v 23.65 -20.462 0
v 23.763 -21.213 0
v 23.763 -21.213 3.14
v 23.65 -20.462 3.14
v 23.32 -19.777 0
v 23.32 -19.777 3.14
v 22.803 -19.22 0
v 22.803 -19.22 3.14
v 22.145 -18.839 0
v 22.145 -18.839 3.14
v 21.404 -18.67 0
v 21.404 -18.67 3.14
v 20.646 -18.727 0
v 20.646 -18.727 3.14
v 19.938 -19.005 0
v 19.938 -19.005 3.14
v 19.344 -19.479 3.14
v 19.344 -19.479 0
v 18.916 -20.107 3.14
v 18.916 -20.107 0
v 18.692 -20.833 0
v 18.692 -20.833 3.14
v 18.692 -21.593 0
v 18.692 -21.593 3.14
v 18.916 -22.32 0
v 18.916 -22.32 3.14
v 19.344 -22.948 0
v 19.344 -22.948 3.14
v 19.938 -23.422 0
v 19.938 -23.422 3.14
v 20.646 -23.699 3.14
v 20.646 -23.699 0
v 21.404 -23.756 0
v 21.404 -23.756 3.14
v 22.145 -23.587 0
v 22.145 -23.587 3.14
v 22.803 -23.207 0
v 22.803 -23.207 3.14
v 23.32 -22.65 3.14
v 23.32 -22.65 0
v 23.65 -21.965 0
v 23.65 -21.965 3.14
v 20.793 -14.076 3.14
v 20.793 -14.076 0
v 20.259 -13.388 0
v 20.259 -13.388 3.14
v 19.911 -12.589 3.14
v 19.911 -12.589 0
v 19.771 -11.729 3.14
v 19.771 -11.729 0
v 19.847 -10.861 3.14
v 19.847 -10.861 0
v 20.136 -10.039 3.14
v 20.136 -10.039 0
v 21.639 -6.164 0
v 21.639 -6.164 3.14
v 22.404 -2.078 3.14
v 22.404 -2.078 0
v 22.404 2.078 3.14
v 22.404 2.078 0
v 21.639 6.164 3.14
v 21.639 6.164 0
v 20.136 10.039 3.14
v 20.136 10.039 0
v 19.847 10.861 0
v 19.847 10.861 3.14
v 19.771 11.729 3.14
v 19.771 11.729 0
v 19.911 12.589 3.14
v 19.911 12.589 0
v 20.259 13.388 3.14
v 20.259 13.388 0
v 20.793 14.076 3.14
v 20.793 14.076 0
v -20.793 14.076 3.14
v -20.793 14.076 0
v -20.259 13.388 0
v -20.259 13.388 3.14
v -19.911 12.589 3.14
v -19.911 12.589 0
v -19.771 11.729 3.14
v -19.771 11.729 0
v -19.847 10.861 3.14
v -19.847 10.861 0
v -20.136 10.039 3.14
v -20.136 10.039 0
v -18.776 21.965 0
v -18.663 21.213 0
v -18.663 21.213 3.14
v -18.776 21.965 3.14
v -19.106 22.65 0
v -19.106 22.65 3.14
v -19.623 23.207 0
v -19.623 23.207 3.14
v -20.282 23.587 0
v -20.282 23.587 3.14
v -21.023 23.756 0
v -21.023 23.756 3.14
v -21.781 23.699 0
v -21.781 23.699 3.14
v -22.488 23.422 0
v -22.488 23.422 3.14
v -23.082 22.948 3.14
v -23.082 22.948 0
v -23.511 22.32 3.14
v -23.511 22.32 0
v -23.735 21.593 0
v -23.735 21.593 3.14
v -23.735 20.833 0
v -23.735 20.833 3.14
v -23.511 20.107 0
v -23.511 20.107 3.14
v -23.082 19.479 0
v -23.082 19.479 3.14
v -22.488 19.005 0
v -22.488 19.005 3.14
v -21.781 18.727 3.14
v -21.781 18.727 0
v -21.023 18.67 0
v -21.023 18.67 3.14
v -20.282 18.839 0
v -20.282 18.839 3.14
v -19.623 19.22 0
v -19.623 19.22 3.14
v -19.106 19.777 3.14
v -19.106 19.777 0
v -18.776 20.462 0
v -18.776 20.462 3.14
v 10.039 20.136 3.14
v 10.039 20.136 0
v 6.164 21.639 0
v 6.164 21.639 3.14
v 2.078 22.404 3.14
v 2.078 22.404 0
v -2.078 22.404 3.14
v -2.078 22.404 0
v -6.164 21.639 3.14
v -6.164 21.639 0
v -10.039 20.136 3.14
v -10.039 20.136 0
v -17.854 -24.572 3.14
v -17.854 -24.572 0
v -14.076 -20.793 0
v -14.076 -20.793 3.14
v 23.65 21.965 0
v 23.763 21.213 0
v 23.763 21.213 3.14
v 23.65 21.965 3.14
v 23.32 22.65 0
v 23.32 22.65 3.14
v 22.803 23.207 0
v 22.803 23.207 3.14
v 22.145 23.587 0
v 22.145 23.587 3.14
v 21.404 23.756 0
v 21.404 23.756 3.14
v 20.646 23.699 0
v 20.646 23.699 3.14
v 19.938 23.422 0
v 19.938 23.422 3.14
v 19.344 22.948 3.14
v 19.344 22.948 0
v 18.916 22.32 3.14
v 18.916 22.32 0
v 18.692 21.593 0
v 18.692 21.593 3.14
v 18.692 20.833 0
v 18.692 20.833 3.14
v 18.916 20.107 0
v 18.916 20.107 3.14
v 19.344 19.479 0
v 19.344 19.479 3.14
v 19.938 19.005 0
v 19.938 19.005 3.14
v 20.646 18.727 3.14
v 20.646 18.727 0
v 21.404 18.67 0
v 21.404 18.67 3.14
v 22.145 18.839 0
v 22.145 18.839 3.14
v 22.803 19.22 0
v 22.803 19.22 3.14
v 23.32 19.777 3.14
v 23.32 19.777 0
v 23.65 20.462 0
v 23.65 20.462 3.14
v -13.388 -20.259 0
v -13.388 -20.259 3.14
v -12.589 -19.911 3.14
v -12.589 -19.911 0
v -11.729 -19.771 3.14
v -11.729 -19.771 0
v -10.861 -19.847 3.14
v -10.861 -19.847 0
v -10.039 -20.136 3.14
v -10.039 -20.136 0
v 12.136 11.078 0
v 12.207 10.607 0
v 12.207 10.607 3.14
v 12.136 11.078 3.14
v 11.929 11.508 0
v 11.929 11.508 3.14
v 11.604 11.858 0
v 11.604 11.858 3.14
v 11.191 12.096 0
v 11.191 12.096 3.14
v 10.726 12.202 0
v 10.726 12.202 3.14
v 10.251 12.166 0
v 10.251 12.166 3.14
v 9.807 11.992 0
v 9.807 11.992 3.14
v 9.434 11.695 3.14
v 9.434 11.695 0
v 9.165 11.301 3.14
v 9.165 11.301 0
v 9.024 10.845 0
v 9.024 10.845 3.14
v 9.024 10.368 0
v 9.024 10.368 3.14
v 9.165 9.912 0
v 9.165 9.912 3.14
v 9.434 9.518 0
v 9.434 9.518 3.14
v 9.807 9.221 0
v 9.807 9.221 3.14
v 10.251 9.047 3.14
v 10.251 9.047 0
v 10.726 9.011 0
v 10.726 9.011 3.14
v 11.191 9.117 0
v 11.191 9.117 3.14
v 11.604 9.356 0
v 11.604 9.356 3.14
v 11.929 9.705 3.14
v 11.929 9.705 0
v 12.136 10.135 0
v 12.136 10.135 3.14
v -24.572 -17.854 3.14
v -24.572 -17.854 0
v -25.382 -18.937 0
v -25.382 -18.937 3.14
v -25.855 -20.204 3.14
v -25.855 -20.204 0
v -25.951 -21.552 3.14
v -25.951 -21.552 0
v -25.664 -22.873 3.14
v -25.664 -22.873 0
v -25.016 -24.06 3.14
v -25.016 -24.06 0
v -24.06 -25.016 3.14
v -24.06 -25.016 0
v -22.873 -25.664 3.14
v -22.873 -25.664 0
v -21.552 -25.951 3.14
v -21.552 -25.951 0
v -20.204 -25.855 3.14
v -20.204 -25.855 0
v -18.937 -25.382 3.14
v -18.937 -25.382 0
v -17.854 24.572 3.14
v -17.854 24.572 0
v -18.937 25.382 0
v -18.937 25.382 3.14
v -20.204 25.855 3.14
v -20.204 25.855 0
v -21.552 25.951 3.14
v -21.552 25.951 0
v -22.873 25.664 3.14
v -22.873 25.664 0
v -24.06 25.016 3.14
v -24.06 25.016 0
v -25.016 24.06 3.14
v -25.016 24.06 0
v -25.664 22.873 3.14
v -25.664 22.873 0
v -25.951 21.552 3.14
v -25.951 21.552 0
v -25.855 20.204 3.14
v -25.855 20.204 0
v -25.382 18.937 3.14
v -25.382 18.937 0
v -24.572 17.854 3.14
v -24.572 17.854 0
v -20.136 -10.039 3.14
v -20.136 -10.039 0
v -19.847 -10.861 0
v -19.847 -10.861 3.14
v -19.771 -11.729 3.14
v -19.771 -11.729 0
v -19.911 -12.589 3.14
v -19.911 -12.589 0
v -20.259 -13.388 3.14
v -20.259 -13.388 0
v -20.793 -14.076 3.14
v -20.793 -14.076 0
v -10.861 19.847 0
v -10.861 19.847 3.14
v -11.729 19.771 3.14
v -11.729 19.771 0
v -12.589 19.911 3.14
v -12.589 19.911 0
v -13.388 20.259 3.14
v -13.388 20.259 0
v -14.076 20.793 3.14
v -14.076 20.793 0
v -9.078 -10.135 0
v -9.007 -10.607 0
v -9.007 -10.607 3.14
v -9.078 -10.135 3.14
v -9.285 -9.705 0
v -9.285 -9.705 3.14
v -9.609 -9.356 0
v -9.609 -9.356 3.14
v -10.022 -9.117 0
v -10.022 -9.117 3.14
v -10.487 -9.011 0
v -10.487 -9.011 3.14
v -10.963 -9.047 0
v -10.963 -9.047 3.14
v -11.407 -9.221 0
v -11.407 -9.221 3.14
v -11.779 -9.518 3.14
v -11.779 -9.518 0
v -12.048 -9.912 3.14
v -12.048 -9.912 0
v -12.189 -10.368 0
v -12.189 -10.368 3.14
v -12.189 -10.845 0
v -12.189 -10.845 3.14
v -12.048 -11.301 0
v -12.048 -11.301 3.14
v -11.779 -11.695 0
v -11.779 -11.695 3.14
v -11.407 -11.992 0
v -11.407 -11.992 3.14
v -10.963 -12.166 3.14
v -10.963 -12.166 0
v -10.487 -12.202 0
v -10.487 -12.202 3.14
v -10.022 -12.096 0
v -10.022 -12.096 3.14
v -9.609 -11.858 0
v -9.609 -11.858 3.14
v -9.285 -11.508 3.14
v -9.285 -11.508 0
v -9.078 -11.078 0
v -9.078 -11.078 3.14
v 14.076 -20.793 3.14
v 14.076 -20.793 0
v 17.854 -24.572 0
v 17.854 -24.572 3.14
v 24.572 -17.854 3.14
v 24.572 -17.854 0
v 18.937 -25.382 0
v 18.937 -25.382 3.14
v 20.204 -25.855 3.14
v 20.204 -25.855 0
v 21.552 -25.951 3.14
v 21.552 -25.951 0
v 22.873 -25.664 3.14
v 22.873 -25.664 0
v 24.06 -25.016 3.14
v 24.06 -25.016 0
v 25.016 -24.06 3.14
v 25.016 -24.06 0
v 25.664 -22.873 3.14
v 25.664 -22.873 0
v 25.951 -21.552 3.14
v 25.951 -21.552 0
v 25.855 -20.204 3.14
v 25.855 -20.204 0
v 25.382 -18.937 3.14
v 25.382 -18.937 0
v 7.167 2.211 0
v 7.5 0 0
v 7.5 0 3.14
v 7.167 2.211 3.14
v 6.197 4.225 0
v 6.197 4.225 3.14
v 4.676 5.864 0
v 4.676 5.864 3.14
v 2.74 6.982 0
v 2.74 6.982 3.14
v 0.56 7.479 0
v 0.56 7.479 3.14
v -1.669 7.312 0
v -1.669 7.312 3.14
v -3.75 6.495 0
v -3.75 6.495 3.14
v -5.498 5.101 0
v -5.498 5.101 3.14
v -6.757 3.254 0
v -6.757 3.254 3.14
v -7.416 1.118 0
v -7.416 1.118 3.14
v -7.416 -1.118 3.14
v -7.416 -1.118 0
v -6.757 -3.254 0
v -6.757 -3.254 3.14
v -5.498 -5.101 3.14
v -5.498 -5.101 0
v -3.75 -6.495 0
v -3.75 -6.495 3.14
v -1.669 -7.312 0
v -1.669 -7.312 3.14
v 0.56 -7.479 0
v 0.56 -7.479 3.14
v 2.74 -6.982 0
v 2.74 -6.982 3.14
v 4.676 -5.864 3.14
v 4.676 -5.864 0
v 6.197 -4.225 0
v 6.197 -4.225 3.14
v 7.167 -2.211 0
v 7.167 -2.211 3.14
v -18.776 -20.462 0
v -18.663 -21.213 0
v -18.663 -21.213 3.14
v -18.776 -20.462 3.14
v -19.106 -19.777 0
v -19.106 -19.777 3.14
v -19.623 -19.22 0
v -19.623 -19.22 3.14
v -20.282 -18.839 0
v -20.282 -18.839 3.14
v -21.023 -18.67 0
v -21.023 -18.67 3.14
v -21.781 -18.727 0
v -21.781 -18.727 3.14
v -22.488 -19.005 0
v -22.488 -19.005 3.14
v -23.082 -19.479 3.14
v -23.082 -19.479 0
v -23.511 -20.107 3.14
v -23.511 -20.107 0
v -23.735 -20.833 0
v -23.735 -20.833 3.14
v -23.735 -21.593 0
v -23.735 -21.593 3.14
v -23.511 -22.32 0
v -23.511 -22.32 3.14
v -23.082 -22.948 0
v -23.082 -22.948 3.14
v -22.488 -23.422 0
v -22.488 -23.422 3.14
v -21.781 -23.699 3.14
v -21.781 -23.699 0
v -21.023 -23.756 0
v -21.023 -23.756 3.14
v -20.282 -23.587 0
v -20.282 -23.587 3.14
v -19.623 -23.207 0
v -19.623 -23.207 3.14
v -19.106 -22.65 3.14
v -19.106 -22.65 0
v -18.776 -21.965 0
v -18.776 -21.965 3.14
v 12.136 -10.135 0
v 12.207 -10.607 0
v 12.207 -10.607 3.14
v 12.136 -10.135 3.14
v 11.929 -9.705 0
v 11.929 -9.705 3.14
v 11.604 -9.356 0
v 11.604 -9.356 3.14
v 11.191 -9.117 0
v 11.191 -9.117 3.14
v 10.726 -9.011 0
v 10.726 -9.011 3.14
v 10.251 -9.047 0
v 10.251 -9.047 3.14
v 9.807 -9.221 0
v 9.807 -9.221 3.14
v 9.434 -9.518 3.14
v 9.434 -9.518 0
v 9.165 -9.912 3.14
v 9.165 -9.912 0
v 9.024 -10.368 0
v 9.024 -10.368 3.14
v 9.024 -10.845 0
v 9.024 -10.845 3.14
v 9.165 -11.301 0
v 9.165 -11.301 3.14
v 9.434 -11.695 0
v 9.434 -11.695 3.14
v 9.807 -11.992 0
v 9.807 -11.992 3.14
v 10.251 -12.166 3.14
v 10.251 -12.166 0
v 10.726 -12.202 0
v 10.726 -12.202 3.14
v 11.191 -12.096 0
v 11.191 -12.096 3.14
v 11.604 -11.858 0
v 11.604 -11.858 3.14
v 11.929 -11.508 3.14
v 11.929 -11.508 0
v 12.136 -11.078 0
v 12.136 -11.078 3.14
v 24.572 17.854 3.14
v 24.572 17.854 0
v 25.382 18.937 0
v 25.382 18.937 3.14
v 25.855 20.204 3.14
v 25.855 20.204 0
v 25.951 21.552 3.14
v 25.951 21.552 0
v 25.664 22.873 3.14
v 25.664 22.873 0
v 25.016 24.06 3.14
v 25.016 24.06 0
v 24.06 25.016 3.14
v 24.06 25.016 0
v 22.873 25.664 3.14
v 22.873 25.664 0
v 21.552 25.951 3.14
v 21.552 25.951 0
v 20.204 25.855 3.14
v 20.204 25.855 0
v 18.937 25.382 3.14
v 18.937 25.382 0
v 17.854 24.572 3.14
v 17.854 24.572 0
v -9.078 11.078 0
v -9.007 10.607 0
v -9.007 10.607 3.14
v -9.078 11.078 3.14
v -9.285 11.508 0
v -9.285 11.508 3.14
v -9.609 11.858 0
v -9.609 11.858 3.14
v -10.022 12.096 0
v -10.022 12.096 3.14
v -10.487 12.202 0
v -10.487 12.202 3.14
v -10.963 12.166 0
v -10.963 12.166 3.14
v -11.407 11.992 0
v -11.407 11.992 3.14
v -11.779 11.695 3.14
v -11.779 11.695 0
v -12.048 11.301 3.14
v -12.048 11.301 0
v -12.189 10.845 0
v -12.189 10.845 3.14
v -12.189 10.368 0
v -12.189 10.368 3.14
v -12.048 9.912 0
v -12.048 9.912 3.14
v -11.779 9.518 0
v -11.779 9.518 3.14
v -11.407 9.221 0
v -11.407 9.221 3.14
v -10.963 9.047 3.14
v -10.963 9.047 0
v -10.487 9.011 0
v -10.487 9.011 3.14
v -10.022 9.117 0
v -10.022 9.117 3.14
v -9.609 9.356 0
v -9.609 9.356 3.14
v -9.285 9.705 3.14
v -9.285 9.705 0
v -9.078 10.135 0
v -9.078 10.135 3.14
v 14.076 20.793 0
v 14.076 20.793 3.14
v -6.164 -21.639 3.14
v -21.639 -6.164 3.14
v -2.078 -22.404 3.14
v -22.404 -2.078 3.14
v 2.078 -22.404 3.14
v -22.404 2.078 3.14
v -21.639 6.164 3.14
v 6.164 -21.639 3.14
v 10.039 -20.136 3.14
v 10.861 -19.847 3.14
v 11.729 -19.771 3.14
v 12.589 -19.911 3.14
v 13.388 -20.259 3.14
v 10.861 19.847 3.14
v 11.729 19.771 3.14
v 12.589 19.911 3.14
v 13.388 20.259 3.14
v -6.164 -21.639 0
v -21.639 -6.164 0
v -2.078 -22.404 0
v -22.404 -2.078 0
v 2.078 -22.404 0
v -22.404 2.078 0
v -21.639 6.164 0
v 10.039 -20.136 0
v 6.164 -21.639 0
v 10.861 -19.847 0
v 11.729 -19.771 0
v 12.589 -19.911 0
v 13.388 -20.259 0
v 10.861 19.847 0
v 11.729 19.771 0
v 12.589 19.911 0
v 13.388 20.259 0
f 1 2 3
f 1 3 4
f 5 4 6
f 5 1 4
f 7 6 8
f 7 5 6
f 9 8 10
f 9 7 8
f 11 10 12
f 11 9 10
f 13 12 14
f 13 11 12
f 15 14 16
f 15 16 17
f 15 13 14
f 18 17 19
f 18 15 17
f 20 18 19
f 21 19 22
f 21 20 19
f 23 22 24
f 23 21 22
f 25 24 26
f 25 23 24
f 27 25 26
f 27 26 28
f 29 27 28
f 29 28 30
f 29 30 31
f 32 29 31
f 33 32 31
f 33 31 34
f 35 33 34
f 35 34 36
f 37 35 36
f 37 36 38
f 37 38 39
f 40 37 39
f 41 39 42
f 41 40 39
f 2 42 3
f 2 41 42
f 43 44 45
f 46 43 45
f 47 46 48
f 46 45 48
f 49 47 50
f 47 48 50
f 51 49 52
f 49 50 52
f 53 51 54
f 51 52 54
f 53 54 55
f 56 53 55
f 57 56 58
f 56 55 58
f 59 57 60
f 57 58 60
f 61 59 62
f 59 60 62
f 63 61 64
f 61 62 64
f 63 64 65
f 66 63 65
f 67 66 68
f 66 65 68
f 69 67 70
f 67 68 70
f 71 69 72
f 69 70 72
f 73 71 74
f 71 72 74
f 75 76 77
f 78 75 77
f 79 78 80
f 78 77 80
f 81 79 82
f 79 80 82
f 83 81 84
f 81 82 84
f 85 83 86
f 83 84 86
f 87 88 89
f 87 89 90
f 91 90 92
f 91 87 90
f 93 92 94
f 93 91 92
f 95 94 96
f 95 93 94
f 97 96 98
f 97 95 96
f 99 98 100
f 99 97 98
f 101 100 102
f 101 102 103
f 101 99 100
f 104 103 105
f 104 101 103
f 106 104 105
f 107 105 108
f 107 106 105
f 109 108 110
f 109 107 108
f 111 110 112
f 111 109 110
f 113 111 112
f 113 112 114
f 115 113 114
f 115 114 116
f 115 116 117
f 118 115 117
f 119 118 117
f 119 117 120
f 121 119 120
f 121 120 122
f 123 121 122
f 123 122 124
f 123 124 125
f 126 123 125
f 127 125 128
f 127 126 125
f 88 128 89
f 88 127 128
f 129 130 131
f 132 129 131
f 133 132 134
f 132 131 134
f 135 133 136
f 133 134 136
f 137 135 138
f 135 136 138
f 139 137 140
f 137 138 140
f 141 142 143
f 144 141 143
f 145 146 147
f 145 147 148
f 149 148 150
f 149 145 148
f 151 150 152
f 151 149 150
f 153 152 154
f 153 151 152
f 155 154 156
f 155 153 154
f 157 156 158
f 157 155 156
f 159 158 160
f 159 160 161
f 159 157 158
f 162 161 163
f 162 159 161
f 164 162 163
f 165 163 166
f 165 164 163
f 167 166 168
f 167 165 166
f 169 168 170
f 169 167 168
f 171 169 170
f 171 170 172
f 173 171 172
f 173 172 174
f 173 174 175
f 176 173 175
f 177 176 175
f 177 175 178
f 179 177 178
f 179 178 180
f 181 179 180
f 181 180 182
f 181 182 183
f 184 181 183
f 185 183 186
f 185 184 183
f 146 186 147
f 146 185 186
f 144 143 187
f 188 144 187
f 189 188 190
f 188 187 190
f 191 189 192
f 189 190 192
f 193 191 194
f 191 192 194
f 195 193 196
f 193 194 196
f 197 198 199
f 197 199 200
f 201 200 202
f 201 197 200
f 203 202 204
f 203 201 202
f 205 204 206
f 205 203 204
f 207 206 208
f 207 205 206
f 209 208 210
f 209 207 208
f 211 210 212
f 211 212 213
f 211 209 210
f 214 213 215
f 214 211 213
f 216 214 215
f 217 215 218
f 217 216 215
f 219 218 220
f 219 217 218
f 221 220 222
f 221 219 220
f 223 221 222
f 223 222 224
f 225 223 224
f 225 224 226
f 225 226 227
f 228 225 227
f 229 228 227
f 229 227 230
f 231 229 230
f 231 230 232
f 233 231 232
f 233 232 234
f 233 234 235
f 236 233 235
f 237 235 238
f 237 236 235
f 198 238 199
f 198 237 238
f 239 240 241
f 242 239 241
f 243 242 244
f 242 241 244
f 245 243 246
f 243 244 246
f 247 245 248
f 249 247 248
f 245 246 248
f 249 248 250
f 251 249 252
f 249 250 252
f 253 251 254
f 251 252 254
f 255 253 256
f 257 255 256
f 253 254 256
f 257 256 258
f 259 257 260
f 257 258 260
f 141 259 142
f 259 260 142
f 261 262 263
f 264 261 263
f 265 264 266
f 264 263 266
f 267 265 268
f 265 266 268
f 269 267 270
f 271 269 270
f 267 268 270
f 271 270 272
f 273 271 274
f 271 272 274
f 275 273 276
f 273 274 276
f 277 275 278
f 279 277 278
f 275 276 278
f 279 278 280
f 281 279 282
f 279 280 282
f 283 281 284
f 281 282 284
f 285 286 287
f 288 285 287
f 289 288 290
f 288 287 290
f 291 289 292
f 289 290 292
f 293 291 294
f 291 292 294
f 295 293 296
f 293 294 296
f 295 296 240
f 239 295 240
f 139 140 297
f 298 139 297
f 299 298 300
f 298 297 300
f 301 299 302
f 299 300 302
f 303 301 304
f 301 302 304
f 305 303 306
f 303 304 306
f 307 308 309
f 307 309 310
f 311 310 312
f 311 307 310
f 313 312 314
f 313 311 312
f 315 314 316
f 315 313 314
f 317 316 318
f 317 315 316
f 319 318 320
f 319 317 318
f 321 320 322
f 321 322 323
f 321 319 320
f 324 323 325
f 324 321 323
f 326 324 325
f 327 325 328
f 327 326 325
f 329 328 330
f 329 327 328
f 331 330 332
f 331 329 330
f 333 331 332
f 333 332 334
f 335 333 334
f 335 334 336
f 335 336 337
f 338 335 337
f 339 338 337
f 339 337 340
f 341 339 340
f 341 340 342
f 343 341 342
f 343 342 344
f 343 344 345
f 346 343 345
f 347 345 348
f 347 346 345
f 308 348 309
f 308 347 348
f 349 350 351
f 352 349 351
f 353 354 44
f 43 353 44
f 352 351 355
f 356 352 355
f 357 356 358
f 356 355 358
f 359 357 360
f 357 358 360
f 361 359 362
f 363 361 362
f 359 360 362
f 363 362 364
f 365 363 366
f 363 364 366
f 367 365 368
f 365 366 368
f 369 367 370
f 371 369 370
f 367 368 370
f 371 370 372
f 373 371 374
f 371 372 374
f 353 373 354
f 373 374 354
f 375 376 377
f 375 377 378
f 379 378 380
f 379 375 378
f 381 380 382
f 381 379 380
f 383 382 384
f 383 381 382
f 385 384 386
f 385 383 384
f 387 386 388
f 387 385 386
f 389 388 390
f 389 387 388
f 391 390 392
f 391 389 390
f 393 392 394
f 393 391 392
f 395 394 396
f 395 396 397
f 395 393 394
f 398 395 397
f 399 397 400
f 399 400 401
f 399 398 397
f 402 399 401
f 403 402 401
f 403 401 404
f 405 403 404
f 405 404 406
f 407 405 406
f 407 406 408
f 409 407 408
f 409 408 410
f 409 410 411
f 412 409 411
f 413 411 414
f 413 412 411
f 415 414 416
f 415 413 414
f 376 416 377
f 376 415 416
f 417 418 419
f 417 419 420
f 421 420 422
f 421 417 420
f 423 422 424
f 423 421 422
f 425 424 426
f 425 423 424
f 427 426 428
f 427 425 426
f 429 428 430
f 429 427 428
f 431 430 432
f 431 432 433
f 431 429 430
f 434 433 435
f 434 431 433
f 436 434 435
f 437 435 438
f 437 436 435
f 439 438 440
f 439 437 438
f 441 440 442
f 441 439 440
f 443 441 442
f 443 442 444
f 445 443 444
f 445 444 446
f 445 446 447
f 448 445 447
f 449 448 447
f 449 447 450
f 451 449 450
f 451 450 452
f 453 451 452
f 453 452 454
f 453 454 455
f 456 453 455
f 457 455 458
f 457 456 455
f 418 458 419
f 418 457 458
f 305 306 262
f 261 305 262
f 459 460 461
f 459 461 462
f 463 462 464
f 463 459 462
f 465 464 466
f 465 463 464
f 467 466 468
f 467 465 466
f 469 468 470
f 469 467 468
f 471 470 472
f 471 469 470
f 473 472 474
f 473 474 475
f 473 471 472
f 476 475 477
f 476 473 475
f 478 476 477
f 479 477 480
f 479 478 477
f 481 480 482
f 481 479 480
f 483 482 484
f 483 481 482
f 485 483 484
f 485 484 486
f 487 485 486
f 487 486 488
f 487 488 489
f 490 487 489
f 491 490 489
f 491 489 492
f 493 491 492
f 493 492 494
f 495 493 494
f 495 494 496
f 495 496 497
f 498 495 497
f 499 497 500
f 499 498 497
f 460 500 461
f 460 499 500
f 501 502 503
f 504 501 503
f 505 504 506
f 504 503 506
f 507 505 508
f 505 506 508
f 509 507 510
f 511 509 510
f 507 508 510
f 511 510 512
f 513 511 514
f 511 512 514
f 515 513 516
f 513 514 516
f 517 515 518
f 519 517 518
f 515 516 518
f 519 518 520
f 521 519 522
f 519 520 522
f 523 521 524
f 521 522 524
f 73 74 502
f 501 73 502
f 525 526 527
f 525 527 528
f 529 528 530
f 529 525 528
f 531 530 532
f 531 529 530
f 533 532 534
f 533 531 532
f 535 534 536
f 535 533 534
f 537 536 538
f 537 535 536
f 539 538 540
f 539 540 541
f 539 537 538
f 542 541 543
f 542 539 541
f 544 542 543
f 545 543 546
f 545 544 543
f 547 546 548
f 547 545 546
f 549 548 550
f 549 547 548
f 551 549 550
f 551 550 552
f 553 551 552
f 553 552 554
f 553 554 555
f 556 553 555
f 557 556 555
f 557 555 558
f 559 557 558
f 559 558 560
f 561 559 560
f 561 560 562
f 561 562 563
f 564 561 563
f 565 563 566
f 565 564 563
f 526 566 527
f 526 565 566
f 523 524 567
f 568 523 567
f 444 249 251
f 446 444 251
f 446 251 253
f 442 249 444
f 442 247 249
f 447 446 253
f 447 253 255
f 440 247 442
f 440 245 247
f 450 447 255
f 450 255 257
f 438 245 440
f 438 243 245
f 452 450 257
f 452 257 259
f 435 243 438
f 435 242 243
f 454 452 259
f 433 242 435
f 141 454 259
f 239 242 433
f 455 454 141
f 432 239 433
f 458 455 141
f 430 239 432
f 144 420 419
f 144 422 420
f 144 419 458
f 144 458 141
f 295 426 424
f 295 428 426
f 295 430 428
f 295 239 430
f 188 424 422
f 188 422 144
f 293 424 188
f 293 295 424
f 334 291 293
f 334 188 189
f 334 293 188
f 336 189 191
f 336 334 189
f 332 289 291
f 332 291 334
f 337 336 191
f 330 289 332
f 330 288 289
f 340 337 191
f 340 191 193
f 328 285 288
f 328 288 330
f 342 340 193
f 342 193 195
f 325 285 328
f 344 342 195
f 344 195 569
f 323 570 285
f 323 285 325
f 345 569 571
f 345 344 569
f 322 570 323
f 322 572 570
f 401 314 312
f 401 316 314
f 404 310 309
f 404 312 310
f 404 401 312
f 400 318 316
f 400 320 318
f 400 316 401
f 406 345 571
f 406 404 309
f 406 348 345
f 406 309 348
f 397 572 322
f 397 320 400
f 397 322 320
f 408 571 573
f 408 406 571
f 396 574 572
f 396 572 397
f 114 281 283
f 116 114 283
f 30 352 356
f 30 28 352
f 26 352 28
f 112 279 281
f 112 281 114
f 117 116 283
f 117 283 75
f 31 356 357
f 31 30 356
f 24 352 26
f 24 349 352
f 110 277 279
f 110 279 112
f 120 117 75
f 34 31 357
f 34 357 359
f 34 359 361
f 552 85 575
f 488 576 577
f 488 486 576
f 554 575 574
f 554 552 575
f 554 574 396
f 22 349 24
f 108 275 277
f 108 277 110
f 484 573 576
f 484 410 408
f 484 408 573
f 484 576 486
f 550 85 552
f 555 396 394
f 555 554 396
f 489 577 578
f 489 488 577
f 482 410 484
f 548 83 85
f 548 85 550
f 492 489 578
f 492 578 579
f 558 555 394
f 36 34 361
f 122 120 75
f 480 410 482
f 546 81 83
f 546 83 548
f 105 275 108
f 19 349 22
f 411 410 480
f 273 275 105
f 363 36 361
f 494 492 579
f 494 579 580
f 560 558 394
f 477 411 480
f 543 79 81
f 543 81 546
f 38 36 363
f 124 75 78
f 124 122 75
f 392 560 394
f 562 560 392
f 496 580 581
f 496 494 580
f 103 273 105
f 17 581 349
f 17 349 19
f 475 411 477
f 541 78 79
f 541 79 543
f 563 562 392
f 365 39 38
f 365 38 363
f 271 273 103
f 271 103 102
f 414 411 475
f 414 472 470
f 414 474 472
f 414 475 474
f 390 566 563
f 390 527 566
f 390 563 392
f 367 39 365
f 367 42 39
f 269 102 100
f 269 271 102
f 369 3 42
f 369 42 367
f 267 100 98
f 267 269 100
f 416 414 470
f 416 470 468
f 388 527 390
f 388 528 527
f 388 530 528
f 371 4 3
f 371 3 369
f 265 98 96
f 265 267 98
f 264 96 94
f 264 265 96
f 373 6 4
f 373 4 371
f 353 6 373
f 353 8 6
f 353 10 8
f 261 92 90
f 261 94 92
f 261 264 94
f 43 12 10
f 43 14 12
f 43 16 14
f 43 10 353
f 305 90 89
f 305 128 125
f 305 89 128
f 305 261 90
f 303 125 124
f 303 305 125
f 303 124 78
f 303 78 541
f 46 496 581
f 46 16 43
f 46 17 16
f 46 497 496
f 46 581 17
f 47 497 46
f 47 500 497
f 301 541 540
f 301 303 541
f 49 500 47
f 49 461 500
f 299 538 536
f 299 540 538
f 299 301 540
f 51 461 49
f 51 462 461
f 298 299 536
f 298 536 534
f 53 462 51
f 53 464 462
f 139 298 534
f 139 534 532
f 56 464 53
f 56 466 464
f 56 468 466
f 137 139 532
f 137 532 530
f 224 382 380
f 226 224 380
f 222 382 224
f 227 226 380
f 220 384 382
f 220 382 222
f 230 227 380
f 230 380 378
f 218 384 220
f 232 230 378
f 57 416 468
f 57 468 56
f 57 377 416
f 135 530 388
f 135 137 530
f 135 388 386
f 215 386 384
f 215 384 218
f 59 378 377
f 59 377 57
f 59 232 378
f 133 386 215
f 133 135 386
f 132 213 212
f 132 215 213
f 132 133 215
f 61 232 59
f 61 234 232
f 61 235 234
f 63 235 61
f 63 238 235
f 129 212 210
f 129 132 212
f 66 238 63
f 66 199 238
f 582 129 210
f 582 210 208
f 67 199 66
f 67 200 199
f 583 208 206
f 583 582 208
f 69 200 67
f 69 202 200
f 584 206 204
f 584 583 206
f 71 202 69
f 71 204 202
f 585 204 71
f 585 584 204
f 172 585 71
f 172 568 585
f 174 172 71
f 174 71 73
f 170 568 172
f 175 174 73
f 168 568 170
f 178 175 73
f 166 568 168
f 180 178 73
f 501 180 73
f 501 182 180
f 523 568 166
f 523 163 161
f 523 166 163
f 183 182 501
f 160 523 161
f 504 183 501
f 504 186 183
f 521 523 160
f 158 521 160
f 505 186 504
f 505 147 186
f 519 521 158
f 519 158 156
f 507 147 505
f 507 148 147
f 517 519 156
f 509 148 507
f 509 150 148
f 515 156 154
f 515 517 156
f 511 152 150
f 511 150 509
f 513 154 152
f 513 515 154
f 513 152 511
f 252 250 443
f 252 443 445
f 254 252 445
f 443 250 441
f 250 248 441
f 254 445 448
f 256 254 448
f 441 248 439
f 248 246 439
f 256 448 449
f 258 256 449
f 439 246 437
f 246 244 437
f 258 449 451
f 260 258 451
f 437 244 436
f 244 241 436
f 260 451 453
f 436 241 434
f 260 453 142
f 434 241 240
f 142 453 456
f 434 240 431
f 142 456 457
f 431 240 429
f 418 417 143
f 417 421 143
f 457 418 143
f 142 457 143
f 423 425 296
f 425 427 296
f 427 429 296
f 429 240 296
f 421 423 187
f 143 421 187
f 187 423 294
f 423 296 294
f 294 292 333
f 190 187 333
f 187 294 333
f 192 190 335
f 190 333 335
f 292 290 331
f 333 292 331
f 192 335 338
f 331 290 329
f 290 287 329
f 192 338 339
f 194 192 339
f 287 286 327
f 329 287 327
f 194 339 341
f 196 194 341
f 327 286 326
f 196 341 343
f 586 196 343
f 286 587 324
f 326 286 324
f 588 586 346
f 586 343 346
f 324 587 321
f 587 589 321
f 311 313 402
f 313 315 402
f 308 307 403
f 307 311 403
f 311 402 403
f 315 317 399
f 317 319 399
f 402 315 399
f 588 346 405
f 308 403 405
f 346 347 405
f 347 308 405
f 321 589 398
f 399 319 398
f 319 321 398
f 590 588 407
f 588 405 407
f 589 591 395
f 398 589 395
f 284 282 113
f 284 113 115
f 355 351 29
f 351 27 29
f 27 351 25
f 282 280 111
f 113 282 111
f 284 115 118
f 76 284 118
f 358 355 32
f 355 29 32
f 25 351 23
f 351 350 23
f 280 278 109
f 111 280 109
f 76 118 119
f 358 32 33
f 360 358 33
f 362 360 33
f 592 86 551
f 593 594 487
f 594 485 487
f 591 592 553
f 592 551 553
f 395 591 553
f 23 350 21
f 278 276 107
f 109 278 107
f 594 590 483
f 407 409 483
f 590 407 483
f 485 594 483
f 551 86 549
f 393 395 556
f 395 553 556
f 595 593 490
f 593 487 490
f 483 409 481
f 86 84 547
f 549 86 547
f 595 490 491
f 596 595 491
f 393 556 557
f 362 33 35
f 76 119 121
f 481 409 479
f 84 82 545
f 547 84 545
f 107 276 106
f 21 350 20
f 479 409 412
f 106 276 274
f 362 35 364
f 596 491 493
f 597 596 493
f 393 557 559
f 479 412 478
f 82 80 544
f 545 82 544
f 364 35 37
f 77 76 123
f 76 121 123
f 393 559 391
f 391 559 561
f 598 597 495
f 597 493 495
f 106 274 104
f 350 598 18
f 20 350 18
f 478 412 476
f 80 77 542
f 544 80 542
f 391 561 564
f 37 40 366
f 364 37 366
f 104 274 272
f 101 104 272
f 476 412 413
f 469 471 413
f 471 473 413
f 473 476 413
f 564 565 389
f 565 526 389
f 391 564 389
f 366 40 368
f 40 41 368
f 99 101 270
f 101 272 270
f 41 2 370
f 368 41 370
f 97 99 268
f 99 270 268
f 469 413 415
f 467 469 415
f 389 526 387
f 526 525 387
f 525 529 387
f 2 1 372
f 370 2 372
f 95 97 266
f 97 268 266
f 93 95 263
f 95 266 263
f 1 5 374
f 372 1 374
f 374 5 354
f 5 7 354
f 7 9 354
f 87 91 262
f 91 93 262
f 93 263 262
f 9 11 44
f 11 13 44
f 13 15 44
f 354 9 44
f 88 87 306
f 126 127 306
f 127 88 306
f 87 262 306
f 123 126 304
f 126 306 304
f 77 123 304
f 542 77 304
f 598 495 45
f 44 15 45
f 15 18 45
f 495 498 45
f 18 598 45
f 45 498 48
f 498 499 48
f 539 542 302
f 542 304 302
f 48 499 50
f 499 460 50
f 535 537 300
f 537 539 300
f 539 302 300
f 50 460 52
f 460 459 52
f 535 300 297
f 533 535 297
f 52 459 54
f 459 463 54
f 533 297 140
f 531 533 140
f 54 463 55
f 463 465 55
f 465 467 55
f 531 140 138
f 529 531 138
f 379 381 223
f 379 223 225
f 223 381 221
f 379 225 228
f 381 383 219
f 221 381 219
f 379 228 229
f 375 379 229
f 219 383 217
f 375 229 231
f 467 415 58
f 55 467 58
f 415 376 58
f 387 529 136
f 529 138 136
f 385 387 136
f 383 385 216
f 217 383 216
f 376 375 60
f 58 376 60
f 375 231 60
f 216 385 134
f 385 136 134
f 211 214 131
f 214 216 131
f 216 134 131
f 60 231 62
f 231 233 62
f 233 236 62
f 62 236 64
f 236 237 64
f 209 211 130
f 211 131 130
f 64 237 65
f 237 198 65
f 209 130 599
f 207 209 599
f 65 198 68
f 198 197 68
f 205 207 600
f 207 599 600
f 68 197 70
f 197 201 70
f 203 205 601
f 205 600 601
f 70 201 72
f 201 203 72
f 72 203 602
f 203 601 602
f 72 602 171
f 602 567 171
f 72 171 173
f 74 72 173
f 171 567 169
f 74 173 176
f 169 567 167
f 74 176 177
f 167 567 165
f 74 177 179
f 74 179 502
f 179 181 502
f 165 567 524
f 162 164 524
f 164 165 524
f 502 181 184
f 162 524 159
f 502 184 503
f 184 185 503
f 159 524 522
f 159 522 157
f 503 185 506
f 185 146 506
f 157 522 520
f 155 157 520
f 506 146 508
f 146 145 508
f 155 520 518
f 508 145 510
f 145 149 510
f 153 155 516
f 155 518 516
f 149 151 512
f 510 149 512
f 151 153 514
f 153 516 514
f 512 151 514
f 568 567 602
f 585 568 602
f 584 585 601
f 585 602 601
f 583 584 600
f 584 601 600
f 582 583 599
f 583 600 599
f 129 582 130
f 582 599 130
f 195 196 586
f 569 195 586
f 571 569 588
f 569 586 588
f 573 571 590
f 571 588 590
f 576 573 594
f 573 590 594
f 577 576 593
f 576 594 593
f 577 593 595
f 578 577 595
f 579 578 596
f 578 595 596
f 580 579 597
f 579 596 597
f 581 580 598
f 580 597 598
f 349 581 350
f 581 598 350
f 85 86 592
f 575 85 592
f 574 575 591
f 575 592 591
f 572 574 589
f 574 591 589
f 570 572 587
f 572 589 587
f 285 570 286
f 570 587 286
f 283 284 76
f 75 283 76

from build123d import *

# Parameters (mm, degrees)
F0_R     = 2.55
F0_R_2   = 1.6
F0_R_3   = 7.5
F1_DEPTH = 3.14


with BuildPart() as f1:
    # F0 (on Top) → F1 (new body)
    with BuildSketch(Plane.XY):
        with BuildLine():
            ThreePointArc((-17.854446, 24.571961), (-24.571961, 24.571961), (-24.571961, 17.854446))
            Line((-24.571961, 17.854446), (-20.793457, 14.075942))
            ThreePointArc((-20.793457, 14.075942), (-19.813844, 12.163673), (-20.136055, 10.039386))
            ThreePointArc((-20.136055, 10.039386), (-22.5, 0), (-20.136055, -10.039386))
            ThreePointArc((-20.136055, -10.039386), (-19.813844, -12.163673), (-20.793457, -14.075942))
            Line((-20.793457, -14.075942), (-24.571961, -17.854446))
            ThreePointArc((-24.571961, -17.854446), (-24.571961, -24.571961), (-17.854446, -24.571961))
            Line((-17.854446, -24.571961), (-14.075942, -20.793457))
            ThreePointArc((-14.075942, -20.793457), (-12.163673, -19.813844), (-10.039386, -20.136055))
            ThreePointArc((-10.039386, -20.136055), (0, -22.5), (10.039386, -20.136055))
            ThreePointArc((10.039386, -20.136055), (12.163673, -19.813844), (14.075942, -20.793457))
            Line((14.075942, -20.793457), (17.854446, -24.571961))
            ThreePointArc((17.854446, -24.571961), (24.571961, -24.571961), (24.571961, -17.854446))
            Line((24.571961, -17.854446), (20.793457, -14.075942))
            ThreePointArc((20.793457, -14.075942), (19.813844, -12.163673), (20.136055, -10.039386))
            ThreePointArc((20.136055, -10.039386), (22.5, 0), (20.136055, 10.039386))
            ThreePointArc((20.136055, 10.039386), (19.813844, 12.163673), (20.793457, 14.075942))
            Line((20.793457, 14.075942), (24.571961, 17.854446))
            ThreePointArc((24.571961, 17.854446), (24.571961, 24.571961), (17.854446, 24.571961))
            Line((17.854446, 24.571961), (14.075942, 20.793457))
            ThreePointArc((14.075942, 20.793457), (12.163673, 19.813844), (10.039386, 20.136055))
            ThreePointArc((10.039386, 20.136055), (0, 22.5), (-10.039386, 20.136055))
            ThreePointArc((-10.039386, 20.136055), (-12.163673, 19.813844), (-14.075942, 20.793457))
            Line((-14.075942, 20.793457), (-17.854446, 24.571961))
        make_face()
        with Locations((-21.213203, -21.213203)):
            Circle(F0_R, mode=Mode.SUBTRACT)
        with Locations((-10.606602, -10.606602)):
            Circle(F0_R_2, mode=Mode.SUBTRACT)
        with Locations((21.213203, -21.213203)):
            Circle(F0_R, mode=Mode.SUBTRACT)
        with Locations((10.606602, -10.606602)):
            Circle(F0_R_2, mode=Mode.SUBTRACT)
        Circle(F0_R_3, mode=Mode.SUBTRACT)
        with Locations((-10.606602, 10.606602)):
            Circle(F0_R_2, mode=Mode.SUBTRACT)
        with Locations((-21.213203, 21.213203)):
            Circle(F0_R, mode=Mode.SUBTRACT)
        with Locations((10.606602, 10.606602)):
            Circle(F0_R_2, mode=Mode.SUBTRACT)
        with Locations((21.213203, 21.213203)):
            Circle(F0_R, mode=Mode.SUBTRACT)
    extrude(amount=F1_DEPTH)


solid = f1.part
